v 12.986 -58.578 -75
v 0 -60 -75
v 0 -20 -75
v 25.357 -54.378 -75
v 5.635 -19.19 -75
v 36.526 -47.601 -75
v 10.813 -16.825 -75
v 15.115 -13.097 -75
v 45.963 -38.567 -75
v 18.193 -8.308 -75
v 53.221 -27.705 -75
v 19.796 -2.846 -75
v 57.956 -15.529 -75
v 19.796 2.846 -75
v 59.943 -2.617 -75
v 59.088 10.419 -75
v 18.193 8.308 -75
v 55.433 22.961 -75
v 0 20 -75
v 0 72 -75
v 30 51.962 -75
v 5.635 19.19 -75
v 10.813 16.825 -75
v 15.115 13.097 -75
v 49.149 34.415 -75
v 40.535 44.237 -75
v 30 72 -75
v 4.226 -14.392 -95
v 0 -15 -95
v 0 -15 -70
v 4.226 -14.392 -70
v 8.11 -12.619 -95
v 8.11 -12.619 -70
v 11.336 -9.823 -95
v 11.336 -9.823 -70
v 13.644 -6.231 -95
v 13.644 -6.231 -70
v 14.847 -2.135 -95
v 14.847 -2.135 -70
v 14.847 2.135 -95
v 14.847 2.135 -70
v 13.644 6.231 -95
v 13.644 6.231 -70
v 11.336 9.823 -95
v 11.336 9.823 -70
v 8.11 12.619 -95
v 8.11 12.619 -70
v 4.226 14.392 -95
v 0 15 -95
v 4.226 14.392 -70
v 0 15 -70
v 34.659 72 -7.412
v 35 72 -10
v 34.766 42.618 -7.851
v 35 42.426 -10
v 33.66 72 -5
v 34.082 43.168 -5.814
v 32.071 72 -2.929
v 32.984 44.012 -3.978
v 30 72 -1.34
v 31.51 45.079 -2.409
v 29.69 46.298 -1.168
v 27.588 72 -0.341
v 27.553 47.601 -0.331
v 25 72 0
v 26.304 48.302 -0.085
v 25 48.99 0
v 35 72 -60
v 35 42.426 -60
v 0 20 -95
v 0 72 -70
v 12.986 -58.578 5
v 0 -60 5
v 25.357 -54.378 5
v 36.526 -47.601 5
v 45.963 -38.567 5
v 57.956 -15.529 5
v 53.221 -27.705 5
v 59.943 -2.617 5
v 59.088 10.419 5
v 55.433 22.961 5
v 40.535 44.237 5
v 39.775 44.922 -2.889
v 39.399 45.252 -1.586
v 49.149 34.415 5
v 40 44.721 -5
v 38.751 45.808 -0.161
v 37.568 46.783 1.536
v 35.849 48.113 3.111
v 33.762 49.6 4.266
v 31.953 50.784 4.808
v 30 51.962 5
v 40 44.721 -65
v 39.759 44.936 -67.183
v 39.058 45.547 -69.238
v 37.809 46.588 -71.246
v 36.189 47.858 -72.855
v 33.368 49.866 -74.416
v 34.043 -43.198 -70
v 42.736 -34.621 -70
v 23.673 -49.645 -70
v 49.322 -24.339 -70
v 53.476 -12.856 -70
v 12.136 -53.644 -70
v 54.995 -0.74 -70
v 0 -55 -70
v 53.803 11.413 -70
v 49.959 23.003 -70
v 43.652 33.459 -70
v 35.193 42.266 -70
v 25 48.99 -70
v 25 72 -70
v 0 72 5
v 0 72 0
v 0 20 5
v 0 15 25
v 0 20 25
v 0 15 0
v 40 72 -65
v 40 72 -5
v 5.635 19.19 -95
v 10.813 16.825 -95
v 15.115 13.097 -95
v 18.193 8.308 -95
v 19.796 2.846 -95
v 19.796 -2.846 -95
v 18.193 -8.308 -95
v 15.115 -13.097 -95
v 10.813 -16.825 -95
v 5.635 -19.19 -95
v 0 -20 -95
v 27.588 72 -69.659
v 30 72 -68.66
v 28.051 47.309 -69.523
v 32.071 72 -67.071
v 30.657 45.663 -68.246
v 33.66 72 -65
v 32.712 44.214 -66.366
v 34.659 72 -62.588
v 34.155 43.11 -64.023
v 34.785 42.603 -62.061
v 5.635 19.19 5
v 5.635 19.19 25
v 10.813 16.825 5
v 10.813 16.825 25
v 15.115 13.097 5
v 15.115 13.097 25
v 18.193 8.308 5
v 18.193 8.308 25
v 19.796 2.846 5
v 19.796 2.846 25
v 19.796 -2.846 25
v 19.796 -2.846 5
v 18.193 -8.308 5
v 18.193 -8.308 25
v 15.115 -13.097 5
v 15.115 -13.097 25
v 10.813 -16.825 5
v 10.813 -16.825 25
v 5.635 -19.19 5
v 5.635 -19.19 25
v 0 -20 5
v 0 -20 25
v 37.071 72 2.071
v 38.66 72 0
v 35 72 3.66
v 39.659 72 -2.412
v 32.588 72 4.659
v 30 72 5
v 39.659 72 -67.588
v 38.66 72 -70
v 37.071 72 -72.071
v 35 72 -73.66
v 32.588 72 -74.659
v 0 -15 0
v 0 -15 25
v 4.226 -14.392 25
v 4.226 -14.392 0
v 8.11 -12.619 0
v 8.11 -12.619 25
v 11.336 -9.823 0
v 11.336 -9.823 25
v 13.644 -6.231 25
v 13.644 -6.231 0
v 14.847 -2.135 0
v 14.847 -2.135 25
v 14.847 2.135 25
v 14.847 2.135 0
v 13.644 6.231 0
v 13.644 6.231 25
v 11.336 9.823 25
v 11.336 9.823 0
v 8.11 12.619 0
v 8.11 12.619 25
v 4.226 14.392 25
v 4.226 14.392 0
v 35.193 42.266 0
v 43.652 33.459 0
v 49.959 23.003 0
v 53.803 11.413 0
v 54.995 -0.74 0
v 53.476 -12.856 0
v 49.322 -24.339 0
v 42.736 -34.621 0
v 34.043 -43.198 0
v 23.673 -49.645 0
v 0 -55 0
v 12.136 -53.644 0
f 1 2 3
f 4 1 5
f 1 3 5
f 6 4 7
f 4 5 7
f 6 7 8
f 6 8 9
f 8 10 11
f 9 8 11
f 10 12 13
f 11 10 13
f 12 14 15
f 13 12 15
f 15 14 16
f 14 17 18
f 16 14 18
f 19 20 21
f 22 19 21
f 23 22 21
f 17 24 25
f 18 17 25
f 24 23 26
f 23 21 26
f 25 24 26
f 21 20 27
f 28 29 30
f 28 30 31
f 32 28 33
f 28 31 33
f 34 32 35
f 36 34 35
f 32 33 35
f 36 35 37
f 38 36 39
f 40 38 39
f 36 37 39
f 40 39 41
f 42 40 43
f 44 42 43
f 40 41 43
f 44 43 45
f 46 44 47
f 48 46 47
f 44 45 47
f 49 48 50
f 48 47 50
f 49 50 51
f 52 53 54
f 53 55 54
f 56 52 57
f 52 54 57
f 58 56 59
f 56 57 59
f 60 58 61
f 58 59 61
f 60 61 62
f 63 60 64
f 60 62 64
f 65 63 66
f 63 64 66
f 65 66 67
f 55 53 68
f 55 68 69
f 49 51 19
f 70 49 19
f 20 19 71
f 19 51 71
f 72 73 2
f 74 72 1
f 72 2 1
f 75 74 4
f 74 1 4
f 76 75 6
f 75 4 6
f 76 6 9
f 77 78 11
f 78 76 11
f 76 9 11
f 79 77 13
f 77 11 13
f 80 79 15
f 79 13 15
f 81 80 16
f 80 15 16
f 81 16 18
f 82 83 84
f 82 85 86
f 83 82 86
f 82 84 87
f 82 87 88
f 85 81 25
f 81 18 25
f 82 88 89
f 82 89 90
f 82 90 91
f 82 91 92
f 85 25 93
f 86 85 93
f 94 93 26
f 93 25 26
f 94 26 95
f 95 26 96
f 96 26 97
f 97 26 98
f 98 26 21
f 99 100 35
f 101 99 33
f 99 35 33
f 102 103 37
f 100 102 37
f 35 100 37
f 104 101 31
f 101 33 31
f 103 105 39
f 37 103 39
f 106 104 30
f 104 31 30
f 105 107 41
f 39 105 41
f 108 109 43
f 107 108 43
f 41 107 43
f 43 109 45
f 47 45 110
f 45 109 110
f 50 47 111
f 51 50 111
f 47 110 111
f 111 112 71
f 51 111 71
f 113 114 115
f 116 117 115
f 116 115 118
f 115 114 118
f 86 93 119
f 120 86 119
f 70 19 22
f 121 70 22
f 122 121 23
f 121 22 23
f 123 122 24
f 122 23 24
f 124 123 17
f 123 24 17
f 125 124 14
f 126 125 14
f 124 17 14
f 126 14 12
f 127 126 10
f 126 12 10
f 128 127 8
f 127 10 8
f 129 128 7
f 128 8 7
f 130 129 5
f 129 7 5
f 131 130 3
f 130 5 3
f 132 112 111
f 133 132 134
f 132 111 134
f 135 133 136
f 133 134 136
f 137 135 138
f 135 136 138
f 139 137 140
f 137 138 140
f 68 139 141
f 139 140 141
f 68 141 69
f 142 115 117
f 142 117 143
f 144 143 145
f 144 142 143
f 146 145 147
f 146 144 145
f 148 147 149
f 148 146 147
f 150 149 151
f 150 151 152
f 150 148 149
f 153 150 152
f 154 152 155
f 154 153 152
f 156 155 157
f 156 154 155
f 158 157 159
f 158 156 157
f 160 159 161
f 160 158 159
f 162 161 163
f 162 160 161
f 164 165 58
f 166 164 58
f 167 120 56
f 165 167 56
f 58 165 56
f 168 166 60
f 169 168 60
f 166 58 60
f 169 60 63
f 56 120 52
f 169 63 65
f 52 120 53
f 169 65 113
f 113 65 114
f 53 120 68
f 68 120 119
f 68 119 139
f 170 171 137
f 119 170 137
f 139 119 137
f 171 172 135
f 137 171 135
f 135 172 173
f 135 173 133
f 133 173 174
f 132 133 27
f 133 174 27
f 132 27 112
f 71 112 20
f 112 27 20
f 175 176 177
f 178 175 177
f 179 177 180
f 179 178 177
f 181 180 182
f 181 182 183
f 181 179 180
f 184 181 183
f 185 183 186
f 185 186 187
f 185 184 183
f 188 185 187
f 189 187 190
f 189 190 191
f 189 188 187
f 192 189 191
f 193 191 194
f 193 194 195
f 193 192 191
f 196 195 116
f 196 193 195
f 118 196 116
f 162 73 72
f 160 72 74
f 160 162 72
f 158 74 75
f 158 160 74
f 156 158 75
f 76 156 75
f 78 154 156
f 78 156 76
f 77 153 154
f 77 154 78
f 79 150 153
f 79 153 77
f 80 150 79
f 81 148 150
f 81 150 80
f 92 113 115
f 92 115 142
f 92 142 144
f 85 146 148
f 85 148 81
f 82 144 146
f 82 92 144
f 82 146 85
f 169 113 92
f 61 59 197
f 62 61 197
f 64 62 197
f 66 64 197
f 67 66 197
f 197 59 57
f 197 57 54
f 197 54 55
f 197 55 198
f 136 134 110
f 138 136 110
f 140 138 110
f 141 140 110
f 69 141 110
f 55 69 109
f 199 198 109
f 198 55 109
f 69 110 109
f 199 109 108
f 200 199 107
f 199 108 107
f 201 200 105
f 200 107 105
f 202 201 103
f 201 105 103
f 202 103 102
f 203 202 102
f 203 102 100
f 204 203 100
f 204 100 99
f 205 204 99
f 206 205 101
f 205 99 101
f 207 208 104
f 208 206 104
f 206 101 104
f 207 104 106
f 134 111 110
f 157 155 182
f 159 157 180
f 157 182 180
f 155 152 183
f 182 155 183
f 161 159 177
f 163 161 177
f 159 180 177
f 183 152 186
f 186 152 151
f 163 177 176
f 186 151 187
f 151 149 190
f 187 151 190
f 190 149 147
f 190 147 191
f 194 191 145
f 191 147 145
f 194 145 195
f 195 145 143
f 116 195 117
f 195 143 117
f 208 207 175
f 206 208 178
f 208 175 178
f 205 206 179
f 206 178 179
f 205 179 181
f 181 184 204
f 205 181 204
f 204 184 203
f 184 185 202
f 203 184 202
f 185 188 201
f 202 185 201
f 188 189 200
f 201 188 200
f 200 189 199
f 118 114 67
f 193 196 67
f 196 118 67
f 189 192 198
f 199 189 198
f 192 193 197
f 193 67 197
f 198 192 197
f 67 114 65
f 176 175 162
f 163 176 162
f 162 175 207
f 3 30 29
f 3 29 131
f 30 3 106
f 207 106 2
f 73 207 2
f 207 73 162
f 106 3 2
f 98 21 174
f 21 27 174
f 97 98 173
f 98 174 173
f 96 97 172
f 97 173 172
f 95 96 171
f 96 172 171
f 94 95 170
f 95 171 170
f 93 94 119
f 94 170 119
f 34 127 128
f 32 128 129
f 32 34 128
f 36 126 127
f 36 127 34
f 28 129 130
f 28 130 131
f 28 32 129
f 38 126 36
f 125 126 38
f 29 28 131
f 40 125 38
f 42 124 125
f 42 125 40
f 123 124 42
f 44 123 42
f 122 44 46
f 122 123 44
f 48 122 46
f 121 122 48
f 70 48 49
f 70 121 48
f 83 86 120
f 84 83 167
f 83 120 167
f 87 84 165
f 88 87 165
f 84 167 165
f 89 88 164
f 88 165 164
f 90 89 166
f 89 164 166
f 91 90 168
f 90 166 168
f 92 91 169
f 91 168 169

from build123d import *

# Parameters (mm, degrees)
BOSS_EXTRUDE1_DEPTH = 25
BOSS_EXTRUDE3_DEPTH = 5
EXTRUDE_THIN2_START = -70
EXTRUDE_THIN2_DEPTH = 70
FILLET1_R           = 10


with BuildPart() as part:
    # Sketch1 → Boss-Extrude1 (new body)
    with BuildSketch(Plane.XY):
        with BuildLine():
            Line((0, -20), (0, -15))
            ThreePointArc((0, -15), (15, 0), (0, 15))
            Line((0, 15), (0, 20))
            ThreePointArc((0, 20), (20, 0), (0, -20))
        make_face()
    extrude(amount=BOSS_EXTRUDE1_DEPTH)


with BuildPart() as body_2:
    # Sketch3 → Boss-Extrude3 (new body)
    with BuildSketch(Plane.XY):
        with BuildLine():
            Line((0, -20), (0, -60))
            ThreePointArc((0, -60), (56.050341538, -21.409325386), (40, 44.72135955))
            Line((40, 44.72135955), (40, 72))
            Line((40, 72), (0, 72))
            Line((0, 72), (0, 60))
            Line((0, 60), (0, 20))
            ThreePointArc((0, 20), (20, 0), (0, -20))
        make_face()
    extrude(amount=BOSS_EXTRUDE3_DEPTH)


with BuildPart() as body_3:
    # Mirror5: mirrored copy
    add(part.part.mirror(Plane.XY.offset(-35)))


with BuildPart() as body_4:
    # Mirror5 2: mirrored copy
    add(body_2.part.mirror(Plane.XY.offset(-35)))


with BuildPart() as part_1:
    add(part.part)

    add(body_2.part)  # Extrude-Thin2 merges body 2

    add(body_4.part)  # Extrude-Thin2 merges body 4

    add(body_3.part)  # Extrude-Thin2 merges body 3
    # Sketch5 → Extrude-Thin2 (add)
    with BuildSketch(Plane.XY.offset(EXTRUDE_THIN2_START)):
        with BuildLine():
            ThreePointArc((0, -60), (56.050341538, -21.409325386), (40, 44.72135955))
            Line((40, 44.72135955), (40, 72))
            Line((40, 72), (35, 72))
            Line((35, 72), (35, 42.426406871))
            ThreePointArc((35, 42.426406871), (51.76124215, -18.594994247), (0, -55))
            Line((0, -55), (0, -60))
        make_face()
    extrude(amount=EXTRUDE_THIN2_DEPTH)

    # Fillet1
    fillet1_edges = [part_1.edges().sort_by_distance(p)[0] for p in [
        (40, 58.360679775, 5),
        (35, 57.213203436, -70),
        (35, 57.213203436, 0),
        (40, 58.360679775, -75),
    ]]
    fillet(fillet1_edges, radius=FILLET1_R)


solid = part_1.part
